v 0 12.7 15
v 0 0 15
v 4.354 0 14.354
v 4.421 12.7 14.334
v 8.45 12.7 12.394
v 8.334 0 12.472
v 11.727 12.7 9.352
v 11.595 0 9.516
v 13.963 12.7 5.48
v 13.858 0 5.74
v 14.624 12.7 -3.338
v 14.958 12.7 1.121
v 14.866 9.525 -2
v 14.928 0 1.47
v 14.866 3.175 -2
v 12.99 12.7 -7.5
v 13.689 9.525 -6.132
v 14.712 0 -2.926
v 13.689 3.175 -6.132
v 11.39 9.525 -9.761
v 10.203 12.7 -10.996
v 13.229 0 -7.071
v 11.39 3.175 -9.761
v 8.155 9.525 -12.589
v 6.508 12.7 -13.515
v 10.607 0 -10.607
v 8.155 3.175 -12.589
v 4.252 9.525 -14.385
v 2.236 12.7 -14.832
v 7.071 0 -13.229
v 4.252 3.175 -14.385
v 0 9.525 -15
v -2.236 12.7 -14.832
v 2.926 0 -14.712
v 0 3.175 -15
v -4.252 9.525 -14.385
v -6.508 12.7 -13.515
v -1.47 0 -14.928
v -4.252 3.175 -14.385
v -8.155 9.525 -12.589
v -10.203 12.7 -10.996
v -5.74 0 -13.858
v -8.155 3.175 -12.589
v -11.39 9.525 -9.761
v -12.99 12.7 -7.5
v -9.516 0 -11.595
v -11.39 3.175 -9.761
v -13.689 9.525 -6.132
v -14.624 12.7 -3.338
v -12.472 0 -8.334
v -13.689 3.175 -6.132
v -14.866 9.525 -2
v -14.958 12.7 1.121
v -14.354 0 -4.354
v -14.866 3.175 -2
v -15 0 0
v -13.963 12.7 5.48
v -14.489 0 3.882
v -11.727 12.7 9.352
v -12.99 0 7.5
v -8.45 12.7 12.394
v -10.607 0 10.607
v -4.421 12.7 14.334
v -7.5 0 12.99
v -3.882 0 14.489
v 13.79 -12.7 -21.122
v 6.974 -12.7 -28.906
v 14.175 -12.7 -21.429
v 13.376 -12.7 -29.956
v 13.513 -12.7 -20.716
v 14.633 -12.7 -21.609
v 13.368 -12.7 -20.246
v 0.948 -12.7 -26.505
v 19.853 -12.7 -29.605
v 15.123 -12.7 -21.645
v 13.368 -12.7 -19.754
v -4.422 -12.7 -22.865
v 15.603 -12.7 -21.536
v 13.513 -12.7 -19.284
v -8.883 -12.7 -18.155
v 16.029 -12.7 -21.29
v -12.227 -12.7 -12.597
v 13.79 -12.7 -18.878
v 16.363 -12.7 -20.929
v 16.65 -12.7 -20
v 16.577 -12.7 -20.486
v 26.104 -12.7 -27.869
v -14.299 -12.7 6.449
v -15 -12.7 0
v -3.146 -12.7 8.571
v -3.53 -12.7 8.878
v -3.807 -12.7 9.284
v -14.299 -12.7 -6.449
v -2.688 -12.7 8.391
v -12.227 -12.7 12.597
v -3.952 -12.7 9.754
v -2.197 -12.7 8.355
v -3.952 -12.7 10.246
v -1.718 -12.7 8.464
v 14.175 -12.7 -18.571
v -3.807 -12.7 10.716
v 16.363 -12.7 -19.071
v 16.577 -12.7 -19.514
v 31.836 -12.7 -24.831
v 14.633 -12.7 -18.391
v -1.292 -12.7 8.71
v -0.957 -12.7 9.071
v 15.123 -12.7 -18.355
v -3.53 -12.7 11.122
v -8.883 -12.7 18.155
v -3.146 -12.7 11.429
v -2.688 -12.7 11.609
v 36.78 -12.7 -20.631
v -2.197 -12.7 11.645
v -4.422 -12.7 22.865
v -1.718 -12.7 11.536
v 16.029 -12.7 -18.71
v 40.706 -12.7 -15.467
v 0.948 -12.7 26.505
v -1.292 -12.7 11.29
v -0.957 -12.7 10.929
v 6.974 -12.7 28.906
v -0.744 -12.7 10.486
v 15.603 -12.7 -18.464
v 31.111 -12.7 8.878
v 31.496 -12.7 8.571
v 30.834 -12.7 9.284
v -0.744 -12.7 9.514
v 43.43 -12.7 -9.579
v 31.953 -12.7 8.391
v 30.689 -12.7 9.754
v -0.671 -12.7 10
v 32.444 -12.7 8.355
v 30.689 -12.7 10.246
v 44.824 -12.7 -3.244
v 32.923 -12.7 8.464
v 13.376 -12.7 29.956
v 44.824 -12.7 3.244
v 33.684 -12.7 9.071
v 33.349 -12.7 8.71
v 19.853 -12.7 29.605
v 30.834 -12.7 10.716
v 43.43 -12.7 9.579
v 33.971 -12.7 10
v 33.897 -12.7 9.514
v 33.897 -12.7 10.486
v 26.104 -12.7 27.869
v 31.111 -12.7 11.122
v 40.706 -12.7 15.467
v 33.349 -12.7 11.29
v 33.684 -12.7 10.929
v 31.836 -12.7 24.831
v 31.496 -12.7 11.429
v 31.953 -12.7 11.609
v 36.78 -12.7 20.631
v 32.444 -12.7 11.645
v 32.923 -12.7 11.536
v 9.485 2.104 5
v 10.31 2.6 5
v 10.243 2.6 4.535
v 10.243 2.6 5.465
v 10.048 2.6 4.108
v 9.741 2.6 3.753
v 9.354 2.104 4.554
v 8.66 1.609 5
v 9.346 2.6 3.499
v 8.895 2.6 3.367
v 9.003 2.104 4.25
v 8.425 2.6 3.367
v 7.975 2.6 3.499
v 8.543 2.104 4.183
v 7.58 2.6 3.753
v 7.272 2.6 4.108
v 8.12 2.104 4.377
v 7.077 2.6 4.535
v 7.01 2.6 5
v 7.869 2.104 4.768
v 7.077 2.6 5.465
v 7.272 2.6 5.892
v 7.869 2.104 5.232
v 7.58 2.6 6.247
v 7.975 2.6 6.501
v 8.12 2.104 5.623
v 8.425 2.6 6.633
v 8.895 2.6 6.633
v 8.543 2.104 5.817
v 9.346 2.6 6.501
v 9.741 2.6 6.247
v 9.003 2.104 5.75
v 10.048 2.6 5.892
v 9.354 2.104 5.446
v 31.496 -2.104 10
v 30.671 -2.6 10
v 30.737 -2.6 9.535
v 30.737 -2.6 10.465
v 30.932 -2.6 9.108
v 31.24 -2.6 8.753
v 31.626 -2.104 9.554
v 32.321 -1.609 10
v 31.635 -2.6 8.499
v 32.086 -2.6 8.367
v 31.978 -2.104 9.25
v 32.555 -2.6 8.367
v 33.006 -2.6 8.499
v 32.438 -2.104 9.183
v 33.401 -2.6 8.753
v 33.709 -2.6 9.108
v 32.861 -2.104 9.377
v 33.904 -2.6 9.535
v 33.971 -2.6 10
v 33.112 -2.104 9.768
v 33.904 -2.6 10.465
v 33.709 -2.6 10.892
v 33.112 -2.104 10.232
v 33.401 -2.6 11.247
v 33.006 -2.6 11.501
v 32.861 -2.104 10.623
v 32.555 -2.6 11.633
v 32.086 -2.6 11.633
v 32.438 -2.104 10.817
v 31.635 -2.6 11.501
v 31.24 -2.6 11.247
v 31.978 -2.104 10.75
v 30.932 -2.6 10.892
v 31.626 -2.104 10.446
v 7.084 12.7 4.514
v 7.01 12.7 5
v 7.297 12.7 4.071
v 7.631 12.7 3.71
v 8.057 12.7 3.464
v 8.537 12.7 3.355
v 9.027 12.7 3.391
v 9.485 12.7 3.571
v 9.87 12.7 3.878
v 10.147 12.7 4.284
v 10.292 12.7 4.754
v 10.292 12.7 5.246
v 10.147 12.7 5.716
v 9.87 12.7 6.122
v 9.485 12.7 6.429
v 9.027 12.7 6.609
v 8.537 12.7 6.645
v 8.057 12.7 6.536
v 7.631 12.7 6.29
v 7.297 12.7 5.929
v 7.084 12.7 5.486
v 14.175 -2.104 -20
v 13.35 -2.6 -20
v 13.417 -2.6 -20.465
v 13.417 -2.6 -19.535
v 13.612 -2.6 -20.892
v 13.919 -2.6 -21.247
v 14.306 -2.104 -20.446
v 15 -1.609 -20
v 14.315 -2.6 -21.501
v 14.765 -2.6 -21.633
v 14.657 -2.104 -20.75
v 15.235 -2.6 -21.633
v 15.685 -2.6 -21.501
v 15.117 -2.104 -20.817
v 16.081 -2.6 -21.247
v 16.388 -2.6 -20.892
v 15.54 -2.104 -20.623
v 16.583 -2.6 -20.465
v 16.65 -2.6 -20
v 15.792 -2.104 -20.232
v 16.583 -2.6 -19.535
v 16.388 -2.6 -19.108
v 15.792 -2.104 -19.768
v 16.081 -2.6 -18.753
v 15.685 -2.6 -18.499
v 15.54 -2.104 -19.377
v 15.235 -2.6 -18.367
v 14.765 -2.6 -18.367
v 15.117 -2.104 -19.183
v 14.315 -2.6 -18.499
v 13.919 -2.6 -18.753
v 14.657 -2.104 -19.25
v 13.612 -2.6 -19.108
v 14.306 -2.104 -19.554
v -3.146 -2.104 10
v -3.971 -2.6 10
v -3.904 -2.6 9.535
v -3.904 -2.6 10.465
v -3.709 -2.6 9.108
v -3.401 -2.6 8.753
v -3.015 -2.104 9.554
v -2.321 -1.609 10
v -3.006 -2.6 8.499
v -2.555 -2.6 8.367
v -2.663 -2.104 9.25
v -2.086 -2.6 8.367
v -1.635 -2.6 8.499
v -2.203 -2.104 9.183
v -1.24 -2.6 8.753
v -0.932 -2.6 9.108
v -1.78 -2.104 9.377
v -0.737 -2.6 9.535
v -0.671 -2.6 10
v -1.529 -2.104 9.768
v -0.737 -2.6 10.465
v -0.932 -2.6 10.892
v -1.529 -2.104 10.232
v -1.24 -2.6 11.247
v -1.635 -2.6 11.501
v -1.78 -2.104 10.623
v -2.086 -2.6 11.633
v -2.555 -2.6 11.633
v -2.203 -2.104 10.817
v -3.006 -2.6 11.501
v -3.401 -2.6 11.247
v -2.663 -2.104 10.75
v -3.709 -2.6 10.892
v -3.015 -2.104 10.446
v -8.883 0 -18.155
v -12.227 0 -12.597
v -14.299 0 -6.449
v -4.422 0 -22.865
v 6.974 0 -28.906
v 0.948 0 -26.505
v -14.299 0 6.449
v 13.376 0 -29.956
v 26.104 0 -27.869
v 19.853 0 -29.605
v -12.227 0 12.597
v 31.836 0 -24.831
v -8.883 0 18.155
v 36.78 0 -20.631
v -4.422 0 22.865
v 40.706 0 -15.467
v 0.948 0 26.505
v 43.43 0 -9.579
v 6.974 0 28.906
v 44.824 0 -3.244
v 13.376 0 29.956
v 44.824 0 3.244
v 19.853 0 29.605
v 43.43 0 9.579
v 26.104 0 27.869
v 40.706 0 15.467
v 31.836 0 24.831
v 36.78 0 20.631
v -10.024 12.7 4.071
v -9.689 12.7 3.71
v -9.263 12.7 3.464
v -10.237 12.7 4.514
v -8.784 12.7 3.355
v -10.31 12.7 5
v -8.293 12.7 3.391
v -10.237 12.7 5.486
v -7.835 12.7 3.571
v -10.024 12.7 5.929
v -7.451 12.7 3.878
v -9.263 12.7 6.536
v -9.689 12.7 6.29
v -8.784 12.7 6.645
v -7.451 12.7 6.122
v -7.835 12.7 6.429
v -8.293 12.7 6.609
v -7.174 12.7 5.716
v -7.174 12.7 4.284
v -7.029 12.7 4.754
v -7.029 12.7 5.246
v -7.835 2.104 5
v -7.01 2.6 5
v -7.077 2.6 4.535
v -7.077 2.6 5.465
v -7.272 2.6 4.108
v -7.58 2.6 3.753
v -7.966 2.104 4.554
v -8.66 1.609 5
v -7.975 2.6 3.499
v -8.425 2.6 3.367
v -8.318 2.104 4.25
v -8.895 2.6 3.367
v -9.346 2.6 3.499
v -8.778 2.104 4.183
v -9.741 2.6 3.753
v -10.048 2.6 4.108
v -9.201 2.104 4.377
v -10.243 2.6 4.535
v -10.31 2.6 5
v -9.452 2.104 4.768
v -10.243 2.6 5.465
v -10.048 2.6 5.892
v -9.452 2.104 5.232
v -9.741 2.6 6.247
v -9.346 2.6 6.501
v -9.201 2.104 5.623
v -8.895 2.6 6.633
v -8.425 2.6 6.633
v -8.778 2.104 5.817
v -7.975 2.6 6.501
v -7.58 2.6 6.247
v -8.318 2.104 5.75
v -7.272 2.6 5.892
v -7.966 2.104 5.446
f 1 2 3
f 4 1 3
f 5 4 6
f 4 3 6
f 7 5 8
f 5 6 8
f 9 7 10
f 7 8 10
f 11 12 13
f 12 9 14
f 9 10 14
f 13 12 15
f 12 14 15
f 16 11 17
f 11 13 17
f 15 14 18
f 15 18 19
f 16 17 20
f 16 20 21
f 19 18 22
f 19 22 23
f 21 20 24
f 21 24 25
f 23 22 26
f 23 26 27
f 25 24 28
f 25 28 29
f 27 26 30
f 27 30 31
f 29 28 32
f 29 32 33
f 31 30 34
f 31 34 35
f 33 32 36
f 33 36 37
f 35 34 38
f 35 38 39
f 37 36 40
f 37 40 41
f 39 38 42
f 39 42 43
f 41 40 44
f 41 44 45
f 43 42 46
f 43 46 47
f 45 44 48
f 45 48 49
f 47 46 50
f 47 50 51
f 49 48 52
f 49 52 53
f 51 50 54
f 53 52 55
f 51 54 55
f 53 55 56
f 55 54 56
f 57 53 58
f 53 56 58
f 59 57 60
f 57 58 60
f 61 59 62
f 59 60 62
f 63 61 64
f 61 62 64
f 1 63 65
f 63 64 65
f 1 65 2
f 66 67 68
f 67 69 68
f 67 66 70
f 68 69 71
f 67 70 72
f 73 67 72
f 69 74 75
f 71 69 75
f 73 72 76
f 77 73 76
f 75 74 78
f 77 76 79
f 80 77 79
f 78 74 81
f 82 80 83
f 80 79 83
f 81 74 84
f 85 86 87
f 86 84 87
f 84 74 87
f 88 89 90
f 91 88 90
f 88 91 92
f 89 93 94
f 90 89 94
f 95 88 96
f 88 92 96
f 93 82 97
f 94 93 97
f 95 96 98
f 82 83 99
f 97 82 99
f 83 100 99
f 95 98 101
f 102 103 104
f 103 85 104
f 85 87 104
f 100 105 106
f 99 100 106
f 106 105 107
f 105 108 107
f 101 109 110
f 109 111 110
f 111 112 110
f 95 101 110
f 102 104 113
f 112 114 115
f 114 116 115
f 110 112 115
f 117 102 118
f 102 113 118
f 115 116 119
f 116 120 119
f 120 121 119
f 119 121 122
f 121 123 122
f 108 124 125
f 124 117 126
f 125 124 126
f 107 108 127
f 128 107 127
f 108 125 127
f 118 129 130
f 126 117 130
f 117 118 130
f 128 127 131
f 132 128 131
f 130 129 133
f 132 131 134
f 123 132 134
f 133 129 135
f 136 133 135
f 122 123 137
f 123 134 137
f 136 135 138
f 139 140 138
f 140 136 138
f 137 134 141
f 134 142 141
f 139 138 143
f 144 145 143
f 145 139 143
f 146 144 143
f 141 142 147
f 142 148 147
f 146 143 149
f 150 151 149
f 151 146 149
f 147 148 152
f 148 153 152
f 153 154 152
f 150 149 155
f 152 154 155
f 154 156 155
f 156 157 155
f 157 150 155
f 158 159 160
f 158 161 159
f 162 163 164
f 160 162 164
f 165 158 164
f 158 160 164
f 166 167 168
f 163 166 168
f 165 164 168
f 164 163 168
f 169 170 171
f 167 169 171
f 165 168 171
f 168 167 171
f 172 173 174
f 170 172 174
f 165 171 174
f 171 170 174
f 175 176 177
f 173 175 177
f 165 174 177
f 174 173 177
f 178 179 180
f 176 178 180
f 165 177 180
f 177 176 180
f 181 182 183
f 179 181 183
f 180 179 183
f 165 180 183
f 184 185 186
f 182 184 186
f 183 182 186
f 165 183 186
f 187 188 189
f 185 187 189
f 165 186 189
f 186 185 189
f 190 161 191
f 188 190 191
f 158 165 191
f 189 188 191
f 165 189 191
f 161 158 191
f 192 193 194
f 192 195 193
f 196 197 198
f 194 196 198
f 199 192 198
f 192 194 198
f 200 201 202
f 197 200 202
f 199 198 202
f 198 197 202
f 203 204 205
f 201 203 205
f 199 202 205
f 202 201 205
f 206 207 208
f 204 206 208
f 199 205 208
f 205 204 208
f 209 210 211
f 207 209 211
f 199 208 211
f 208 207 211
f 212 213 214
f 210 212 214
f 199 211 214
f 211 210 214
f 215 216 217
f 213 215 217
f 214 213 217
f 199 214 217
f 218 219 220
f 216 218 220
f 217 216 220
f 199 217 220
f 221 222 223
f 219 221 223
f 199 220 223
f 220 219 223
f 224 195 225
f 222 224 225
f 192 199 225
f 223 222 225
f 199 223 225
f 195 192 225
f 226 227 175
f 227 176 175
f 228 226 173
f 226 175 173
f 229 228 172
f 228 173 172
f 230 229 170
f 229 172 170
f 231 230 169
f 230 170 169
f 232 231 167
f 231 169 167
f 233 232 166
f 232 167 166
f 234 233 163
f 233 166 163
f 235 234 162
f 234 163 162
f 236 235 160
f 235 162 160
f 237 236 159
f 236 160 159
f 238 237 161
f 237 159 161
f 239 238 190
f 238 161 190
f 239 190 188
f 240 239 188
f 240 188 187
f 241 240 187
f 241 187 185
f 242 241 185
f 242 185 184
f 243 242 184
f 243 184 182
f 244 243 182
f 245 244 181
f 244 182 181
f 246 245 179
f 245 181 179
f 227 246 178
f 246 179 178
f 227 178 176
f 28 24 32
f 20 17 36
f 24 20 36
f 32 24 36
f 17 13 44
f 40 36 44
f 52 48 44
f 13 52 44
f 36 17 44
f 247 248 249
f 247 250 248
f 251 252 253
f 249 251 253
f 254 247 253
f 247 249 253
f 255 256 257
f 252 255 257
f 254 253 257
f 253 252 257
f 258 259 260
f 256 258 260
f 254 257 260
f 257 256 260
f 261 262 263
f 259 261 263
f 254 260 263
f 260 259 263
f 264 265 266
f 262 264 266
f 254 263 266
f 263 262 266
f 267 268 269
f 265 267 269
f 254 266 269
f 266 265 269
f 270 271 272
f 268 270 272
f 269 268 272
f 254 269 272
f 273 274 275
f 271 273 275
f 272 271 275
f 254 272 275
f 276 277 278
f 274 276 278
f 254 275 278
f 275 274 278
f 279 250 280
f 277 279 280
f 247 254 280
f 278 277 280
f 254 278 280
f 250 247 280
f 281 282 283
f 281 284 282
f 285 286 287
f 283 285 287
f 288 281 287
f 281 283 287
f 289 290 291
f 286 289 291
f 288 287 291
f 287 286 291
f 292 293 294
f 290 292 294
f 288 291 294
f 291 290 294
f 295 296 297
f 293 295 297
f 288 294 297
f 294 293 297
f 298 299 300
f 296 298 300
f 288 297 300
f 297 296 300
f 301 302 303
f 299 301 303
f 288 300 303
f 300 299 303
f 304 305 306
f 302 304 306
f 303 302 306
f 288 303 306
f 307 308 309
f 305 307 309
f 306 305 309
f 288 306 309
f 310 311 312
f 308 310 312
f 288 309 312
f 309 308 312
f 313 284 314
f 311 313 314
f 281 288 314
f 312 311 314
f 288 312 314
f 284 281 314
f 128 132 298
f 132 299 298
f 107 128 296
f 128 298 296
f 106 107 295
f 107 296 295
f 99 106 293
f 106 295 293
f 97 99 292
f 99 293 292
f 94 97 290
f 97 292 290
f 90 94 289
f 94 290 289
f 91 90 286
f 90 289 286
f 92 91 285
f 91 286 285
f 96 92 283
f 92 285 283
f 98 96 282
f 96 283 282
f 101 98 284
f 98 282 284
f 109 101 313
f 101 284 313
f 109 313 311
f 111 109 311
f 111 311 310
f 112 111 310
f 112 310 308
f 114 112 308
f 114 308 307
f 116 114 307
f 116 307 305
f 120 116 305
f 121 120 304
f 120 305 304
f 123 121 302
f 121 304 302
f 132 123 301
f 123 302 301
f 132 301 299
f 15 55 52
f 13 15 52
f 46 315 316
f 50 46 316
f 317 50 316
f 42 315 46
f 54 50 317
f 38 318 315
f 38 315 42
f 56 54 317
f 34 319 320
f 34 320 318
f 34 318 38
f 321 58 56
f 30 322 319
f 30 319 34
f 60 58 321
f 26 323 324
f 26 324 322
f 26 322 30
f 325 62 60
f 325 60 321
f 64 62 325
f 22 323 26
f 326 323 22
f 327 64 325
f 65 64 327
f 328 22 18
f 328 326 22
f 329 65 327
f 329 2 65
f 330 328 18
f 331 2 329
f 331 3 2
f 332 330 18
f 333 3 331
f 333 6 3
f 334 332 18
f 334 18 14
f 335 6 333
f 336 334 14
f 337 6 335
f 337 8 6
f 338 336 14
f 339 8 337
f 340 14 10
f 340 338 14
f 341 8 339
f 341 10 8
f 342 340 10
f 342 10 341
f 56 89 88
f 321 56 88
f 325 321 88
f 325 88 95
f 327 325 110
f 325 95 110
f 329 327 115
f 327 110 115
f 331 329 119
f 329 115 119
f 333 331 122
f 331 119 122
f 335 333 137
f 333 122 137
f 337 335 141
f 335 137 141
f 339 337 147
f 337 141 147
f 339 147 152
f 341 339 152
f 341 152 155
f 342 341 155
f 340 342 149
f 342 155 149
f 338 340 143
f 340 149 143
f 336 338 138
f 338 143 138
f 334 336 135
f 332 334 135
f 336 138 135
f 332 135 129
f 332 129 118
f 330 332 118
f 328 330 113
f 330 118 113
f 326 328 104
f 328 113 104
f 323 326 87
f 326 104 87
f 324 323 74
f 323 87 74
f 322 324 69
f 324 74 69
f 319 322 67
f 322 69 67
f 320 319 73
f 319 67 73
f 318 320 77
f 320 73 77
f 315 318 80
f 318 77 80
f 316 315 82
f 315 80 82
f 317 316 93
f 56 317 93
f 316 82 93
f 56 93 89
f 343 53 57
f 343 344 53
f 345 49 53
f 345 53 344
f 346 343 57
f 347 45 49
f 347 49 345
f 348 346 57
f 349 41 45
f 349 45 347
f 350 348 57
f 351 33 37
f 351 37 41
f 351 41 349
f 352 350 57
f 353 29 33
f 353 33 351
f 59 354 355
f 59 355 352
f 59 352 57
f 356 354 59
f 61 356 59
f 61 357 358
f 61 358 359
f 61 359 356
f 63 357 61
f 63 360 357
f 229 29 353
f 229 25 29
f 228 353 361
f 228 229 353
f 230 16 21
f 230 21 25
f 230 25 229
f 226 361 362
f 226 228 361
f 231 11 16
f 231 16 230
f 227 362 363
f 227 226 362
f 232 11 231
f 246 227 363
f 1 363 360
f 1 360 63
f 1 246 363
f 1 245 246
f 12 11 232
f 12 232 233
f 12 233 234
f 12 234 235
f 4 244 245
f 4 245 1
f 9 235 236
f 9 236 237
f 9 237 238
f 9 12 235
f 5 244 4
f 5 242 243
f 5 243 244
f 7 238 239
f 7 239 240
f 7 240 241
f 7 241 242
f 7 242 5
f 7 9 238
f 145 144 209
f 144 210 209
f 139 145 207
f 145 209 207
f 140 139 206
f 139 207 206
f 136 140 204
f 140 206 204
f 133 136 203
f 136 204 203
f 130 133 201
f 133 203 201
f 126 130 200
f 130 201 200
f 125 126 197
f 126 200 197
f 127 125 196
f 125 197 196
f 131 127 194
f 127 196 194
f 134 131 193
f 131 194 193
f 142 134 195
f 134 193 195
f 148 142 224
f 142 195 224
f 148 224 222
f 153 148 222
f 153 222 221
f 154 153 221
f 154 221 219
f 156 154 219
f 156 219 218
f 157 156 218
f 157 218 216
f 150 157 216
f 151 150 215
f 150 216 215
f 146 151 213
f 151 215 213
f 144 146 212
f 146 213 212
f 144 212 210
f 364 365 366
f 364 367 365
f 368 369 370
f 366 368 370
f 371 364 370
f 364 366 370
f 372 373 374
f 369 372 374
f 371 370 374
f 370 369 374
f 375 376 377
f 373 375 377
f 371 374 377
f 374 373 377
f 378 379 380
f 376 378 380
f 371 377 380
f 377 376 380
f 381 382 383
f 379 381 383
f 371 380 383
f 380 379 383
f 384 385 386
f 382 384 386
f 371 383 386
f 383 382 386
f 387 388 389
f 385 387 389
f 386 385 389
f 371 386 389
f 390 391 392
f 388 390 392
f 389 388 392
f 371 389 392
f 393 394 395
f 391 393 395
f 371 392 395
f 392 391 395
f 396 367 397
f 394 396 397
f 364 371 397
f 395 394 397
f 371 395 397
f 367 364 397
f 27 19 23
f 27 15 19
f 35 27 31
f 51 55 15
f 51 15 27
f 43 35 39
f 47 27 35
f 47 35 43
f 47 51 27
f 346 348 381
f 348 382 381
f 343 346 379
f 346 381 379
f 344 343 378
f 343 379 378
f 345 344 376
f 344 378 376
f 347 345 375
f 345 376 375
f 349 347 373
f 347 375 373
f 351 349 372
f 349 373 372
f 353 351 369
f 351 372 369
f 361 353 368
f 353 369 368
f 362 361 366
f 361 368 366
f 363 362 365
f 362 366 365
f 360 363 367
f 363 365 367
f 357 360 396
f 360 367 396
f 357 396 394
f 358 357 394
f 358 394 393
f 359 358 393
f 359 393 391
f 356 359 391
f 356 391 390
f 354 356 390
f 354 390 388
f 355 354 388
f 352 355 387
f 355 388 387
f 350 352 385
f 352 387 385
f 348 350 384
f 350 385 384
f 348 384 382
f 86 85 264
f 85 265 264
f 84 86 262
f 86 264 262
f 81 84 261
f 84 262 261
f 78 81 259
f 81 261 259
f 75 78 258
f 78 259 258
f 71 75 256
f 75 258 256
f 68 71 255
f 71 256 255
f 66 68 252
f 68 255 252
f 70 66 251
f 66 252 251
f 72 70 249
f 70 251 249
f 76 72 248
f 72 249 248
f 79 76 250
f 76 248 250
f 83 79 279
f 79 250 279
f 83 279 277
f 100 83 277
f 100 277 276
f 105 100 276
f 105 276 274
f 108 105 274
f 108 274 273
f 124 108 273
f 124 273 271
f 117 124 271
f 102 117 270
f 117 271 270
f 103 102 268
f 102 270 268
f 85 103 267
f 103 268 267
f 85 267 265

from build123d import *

# Parameters (mm, degrees)
BOSS_EXTRUDE1_DEPTH       = 12.7
SKETCH1_3_R               = 30
BOSS_EXTRUDE2_DEPTH       = 12.7
CUT_EXTRUDE1_DEPTH        = 56.554387766
CUT_EXTRUDE1_DEPTH_BACK   = 56.554387766
SKETCH2_W                 = 13
SKETCH2_H                 = 6.35
M4X0_7_TAPPED_HOLE1_D     = 3.3
M4X0_7_TAPPED_HOLE1_DEPTH = 10.1
M4X0_7_TAPPED_HOLE1_TIP   = 0.991420021
M4X0_7_TAPPED_HOLE2_D     = 3.3
M4X0_7_TAPPED_HOLE2_DEPTH = 10.1
M4X0_7_TAPPED_HOLE2_TIP   = 0.991420021


with BuildPart() as part:
    # Sketch1 → Boss-Extrude1 (new body)
    with BuildSketch(Plane(origin=(0, 0, 0), x_dir=(1, 0, 0), z_dir=(0, 1, 0))):
        with BuildLine():
            ThreePointArc((-15, -5.7e-08), (2.9e-08, -15), (15, 0))
            ThreePointArc((15, 0), (-2.9e-08, 15), (-15, -5.7e-08))
        make_face()
    extrude(amount=BOSS_EXTRUDE1_DEPTH)

    # Sketch1<3> → Boss-Extrude2 (add)
    with BuildSketch(Plane(origin=(0, 0, 0), x_dir=(1, 0, 0), z_dir=(0, 1, 0))):
        with Locations((15, 0)):
            Circle(SKETCH1_3_R)
    extrude(amount=-BOSS_EXTRUDE2_DEPTH)

    # Sketch2 → Cut-Extrude1 (cut, two sides: drawn at the far end of the back side and taken through both)
    with BuildSketch(Plane(origin=(0, 0, 0), x_dir=(0, 0, -1), z_dir=(1, 0, 0)).offset(-CUT_EXTRUDE1_DEPTH_BACK)):
        with Locations((8.5, 6.35)):
            Rectangle(SKETCH2_W, SKETCH2_H)
    extrude(amount=CUT_EXTRUDE1_DEPTH + CUT_EXTRUDE1_DEPTH_BACK, mode=Mode.SUBTRACT)

    # M4x0.7 Tapped Hole1
    with Locations(Plane(origin=(0, 12.7, 0), x_dir=(1, 0, 0), z_dir=(0, 1, 0))):
        with Locations((8.660254038, -5), (-8.660254038, -5)):
            Hole(M4X0_7_TAPPED_HOLE1_D / 2, depth=M4X0_7_TAPPED_HOLE1_DEPTH)
            with Locations((0, 0, -(M4X0_7_TAPPED_HOLE1_DEPTH + M4X0_7_TAPPED_HOLE1_TIP / 2))):  # 118° drill point
                Cone(0, M4X0_7_TAPPED_HOLE1_D / 2, M4X0_7_TAPPED_HOLE1_TIP, mode=Mode.SUBTRACT)

    # M4x0.7 Tapped Hole2
    with Locations(Plane(origin=(0, -12.7, 0), x_dir=(-1, 0, 0), z_dir=(0, -1, 0))):
        with Locations((-15, 20), (-32.320508076, -10), (2.320508076, -10)):
            Hole(M4X0_7_TAPPED_HOLE2_D / 2, depth=M4X0_7_TAPPED_HOLE2_DEPTH)
            with Locations((0, 0, -(M4X0_7_TAPPED_HOLE2_DEPTH + M4X0_7_TAPPED_HOLE2_TIP / 2))):  # 118° drill point
                Cone(0, M4X0_7_TAPPED_HOLE2_D / 2, M4X0_7_TAPPED_HOLE2_TIP, mode=Mode.SUBTRACT)


solid = part.part
